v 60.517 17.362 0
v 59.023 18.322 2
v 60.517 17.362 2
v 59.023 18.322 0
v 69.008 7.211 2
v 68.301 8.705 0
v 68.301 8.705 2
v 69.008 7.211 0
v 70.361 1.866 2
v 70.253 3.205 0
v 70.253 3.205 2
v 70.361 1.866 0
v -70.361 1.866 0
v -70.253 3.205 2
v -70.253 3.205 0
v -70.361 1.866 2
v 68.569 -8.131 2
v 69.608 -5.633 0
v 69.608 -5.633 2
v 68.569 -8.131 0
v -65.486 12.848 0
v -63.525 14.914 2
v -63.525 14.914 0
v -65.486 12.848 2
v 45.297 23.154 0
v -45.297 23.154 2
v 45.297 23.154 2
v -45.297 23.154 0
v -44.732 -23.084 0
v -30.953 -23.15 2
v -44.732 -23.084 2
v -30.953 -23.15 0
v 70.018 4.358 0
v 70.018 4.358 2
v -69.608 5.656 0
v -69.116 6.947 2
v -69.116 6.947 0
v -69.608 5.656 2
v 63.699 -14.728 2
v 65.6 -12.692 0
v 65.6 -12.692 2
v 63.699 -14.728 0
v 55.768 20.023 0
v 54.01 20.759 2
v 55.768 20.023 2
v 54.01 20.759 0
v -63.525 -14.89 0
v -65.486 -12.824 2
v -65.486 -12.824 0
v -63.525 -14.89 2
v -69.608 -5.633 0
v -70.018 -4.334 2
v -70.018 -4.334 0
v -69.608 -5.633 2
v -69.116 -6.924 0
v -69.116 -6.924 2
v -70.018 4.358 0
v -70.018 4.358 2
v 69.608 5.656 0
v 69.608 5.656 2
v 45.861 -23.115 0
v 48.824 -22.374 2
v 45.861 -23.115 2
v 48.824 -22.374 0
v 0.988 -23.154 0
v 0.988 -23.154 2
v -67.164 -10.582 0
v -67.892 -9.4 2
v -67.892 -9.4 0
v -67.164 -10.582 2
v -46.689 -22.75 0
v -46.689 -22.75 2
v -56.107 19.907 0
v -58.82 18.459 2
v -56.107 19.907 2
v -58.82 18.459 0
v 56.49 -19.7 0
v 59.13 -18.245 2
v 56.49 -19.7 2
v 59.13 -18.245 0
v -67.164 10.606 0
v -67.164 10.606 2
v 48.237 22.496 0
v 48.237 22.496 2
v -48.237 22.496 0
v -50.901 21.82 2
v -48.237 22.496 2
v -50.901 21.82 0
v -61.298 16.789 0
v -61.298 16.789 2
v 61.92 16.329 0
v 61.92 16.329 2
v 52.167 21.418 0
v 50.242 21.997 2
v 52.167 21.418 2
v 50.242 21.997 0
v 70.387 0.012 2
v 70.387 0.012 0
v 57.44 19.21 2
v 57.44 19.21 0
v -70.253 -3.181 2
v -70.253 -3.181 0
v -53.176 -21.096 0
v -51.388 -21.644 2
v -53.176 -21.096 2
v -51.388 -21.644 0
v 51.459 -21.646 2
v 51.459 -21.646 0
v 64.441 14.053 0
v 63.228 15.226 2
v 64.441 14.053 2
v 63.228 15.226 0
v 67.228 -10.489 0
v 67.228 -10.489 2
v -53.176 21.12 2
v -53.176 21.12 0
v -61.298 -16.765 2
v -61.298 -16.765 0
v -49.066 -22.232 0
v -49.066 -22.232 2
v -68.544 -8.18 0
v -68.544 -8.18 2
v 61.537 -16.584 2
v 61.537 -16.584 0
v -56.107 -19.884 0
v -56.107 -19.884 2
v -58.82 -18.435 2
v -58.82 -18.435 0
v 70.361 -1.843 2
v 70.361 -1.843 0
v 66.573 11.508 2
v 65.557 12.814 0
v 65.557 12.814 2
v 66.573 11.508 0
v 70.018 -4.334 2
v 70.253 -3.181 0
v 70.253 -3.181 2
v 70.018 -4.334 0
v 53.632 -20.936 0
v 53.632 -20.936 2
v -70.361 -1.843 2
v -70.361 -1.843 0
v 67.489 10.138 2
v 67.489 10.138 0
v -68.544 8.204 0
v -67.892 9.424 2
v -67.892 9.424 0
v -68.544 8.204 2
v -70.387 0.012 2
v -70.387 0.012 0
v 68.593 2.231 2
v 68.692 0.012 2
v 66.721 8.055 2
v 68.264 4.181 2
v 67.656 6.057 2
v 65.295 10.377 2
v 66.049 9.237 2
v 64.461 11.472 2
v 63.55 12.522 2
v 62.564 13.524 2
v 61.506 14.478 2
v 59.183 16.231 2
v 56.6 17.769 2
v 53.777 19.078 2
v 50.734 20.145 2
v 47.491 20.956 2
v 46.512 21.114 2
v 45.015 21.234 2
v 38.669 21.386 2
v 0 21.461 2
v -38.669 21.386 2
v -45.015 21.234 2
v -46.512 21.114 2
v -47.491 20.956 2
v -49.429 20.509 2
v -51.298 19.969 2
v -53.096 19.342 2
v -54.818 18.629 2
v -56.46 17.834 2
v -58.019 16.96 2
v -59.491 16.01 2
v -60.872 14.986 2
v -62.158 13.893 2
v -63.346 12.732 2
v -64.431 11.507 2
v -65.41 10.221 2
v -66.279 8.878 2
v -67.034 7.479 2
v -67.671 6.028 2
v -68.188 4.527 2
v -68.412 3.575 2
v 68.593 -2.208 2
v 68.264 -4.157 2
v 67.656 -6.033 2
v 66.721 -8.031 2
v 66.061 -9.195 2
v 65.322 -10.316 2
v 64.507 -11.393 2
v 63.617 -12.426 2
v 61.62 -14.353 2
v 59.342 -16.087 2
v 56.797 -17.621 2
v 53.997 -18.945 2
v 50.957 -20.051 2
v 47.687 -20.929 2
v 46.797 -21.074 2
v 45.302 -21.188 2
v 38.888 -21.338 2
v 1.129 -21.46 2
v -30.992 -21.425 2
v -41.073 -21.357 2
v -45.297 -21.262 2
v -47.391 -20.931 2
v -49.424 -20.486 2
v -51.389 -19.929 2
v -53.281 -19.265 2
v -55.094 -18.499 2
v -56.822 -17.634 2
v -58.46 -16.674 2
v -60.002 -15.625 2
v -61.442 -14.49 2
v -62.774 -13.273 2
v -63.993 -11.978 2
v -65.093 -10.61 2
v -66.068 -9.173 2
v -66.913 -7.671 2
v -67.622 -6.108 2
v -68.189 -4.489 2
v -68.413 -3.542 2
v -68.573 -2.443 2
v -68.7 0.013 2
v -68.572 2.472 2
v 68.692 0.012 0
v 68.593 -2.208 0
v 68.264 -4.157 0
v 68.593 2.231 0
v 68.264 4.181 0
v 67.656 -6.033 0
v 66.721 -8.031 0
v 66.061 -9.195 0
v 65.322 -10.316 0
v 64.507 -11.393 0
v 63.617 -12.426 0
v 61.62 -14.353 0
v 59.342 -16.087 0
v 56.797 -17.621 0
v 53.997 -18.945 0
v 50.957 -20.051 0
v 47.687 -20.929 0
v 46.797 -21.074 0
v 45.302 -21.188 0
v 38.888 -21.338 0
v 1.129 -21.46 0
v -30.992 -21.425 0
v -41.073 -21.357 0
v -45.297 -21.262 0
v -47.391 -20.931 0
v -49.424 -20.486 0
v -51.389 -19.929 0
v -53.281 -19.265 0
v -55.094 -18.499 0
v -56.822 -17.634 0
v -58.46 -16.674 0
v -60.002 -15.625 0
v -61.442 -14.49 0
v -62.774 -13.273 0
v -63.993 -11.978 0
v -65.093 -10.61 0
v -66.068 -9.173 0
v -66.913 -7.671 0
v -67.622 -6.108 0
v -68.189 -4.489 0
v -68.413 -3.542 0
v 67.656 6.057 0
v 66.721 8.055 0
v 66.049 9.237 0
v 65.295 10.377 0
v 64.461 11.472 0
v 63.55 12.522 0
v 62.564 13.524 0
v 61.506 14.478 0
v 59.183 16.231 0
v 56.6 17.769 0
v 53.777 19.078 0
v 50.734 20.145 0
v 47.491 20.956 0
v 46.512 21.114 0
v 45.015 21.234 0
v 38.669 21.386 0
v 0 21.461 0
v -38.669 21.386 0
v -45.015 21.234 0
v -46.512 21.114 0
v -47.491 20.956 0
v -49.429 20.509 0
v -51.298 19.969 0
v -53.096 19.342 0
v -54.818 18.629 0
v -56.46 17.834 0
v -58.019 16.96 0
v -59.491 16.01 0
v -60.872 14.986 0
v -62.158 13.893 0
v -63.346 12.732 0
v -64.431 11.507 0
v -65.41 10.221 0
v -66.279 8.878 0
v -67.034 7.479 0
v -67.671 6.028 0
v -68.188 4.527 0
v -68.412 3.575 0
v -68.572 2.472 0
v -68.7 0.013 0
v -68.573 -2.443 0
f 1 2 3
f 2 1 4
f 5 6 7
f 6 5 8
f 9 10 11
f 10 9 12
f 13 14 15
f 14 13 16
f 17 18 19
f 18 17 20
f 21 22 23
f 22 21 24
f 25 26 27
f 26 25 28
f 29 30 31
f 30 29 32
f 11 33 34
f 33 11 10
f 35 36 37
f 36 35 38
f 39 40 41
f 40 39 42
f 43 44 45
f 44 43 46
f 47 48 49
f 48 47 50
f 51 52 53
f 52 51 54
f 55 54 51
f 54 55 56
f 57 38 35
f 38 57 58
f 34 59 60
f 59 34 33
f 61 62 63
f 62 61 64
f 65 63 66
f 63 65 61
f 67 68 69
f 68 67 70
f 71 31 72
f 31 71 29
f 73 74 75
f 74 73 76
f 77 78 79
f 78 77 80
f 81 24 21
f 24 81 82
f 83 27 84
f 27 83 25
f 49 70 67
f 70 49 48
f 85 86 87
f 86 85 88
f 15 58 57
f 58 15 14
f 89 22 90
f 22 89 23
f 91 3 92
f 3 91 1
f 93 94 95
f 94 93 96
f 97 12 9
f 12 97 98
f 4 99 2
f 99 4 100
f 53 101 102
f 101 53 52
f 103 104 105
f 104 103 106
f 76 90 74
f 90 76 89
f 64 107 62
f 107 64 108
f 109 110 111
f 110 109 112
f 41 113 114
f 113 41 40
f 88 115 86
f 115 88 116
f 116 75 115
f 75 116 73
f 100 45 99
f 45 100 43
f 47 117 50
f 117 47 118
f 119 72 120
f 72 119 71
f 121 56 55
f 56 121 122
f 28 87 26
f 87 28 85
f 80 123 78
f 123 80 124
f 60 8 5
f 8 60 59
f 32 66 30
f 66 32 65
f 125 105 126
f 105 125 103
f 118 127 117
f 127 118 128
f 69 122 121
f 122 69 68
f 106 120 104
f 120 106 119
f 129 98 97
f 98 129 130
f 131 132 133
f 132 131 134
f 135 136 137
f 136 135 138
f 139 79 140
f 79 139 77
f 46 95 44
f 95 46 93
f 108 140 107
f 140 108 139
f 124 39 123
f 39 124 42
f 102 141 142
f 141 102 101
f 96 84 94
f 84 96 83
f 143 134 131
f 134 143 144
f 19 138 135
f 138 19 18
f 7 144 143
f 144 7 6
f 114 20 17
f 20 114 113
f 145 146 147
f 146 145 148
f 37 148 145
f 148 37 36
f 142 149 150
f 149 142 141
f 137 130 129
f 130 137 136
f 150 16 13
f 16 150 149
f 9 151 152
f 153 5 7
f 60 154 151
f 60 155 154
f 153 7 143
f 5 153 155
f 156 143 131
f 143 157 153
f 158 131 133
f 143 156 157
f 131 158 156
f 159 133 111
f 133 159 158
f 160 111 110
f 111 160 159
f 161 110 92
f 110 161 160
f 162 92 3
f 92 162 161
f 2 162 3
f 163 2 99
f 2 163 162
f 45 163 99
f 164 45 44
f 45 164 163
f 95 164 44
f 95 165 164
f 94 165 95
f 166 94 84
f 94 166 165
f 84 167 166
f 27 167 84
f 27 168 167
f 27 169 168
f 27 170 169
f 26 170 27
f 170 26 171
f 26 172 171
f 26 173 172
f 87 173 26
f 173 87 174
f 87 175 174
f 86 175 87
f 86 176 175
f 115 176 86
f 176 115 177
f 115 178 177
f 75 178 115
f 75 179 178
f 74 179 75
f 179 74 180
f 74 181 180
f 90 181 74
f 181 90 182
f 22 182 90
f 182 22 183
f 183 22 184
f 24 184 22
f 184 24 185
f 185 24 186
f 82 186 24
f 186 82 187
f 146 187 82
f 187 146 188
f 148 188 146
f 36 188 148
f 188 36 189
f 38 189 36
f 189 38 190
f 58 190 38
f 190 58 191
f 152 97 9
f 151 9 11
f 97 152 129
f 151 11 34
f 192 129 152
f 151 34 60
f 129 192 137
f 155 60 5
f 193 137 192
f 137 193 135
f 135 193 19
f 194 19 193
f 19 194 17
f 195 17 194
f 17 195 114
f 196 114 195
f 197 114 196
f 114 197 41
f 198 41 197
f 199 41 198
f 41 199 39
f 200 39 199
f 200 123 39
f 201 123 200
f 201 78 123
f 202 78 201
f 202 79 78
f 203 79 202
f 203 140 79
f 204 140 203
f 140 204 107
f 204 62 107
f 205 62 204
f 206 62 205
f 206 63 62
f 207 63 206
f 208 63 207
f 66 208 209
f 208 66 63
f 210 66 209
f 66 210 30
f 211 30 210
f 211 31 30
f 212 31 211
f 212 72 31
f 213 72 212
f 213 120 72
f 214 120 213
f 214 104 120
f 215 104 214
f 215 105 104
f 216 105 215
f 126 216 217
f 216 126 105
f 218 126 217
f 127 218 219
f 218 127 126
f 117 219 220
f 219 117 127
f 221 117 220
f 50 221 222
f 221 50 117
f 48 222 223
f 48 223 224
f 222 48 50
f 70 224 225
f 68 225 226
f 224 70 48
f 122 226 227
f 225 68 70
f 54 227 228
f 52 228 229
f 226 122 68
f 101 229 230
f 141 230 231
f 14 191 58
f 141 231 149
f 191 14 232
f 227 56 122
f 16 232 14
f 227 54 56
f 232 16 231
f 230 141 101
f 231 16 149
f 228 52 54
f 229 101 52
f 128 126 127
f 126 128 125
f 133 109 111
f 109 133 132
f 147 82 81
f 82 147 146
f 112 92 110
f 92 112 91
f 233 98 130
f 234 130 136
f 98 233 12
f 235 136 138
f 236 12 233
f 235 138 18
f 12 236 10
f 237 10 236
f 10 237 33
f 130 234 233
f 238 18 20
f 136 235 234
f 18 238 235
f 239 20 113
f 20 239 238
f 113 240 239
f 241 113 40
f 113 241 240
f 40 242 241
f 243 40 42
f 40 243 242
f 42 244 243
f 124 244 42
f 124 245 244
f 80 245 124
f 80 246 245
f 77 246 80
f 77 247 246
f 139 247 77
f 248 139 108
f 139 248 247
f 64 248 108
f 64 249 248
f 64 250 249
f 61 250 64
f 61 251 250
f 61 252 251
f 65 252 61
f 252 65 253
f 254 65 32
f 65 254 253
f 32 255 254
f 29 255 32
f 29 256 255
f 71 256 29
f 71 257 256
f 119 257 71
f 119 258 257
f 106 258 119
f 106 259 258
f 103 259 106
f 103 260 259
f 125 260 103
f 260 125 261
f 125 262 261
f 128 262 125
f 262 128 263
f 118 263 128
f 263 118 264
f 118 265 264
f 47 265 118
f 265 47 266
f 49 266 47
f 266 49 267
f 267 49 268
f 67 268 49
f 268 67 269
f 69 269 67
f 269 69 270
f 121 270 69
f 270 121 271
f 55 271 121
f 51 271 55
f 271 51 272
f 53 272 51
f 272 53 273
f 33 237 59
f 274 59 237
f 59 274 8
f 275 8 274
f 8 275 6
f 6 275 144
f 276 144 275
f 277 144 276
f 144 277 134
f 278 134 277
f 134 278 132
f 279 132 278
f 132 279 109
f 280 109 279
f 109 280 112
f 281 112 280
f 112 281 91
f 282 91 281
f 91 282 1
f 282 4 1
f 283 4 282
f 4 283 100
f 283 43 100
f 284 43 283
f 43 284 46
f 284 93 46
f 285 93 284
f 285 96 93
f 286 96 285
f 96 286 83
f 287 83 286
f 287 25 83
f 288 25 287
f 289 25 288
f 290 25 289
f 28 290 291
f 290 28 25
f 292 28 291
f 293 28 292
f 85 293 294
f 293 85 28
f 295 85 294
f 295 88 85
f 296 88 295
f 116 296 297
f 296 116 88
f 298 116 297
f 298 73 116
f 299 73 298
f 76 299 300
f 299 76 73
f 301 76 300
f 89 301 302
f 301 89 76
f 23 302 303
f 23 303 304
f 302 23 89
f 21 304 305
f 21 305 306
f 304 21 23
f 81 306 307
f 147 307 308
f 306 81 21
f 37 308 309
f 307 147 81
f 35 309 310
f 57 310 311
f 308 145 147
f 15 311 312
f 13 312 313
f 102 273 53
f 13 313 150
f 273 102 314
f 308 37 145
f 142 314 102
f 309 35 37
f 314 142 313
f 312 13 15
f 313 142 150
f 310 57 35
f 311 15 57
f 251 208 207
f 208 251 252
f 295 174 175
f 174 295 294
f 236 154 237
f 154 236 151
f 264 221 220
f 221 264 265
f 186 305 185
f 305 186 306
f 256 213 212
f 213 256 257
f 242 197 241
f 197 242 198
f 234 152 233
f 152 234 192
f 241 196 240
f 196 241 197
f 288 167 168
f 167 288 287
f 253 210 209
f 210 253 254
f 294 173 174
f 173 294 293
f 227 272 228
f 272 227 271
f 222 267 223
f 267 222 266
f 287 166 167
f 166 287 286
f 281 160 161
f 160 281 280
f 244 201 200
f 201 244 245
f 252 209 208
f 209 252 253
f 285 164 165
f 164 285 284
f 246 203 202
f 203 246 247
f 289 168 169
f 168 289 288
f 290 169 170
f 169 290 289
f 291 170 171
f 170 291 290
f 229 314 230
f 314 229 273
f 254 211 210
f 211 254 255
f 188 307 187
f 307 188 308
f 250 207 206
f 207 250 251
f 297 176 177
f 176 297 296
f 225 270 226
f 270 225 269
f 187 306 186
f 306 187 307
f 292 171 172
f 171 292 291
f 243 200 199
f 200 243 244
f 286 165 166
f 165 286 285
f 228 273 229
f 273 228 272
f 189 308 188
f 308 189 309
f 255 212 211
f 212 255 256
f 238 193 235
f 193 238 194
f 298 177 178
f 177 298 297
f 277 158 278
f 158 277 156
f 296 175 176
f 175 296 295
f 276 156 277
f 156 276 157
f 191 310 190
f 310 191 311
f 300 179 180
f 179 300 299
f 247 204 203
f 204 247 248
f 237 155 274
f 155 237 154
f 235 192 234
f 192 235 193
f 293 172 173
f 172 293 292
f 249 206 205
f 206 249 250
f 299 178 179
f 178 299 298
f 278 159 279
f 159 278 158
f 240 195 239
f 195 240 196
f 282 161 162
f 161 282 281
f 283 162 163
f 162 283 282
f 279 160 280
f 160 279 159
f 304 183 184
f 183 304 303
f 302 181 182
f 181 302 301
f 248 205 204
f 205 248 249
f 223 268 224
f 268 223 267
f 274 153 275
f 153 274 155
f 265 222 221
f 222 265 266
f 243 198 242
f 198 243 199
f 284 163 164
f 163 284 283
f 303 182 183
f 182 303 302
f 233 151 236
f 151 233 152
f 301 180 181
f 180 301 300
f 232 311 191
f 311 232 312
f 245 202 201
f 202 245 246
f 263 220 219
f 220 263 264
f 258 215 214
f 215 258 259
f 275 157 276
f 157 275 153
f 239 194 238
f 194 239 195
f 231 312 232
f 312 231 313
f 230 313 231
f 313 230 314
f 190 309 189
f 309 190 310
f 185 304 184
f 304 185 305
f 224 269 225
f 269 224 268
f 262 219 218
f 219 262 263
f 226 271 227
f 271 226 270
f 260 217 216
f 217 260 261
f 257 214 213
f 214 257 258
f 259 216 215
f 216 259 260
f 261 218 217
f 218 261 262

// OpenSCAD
// Module names are of the form poly_<inkscape-path-id>().  As a result,
// you can associate a polygon in this OpenSCAD program with the corresponding
// SVG element in the Inkscape document by looking for the XML element with
// the attribute id="inkscape-path-id".

// fudge value is used to ensure that subtracted solids are a tad taller
// in the z dimension than the polygon being subtracted from.  This helps
// keep the resulting .stl file manifold.
fudge = 0.1;

module poly_path3027(h)
{
  scale([25.4/90, -25.4/90, 1]) union()
  {
    difference()
    {
       linear_extrude(height=h)
         polygon([[-158.500006,81.793990],[-165.432780,80.609589],[-173.856986,78.775596],[-182.082397,76.689928],[-188.418786,74.750500],[-198.804823,70.453364],[-208.416354,65.320332],[-217.196650,59.404788],[-225.088984,52.760115],[-232.036629,45.439695],[-237.982856,37.496912],[-240.562710,33.308817],[-242.870937,28.985150],[-244.900446,24.532583],[-246.644146,19.957790],[-248.094232,15.355962],[-248.929660,11.270513],[-249.312250,6.528700],[-249.403820,-0.042220],[-249.312250,-6.613136],[-248.929660,-11.354949],[-248.094232,-15.440397],[-246.644146,-20.042220],[-244.900446,-24.617013],[-242.870937,-29.069580],[-240.562710,-33.393247],[-237.982856,-37.581343],[-232.036629,-45.524125],[-225.088984,-52.844545],[-217.196650,-59.489218],[-208.416354,-65.404763],[-198.804823,-70.537794],[-188.418786,-74.834930],[-180.357158,-77.315728],[-170.918786,-79.709840],[-160.500006,-82.042220],[0.000000,-82.042220],[160.500000,-82.042220],[170.918780,-79.709840],[178.024134,-77.942980],[184.844178,-75.890024],[191.372264,-73.556211],[197.601742,-70.946781],[203.525965,-68.066970],[209.138285,-64.922018],[214.432053,-61.517164],[219.400620,-57.857646],[224.037339,-53.948702],[228.335560,-49.795571],[232.288636,-45.403492],[235.889918,-40.777703],[239.132758,-35.923443],[242.010507,-30.845950],[244.516517,-25.550463],[246.644140,-20.042220],[248.094227,-15.440397],[248.929657,-11.354949],[249.312249,-6.613136],[249.403820,-0.042220],[249.312249,6.528700],[248.929657,11.270513],[248.094227,15.355962],[246.644140,19.957790],[242.959800,28.811414],[238.209221,37.165048],[232.440987,44.972157],[225.703681,52.186204],[218.045888,58.760652],[209.516191,64.648965],[200.163174,69.804606],[190.035420,74.181040],[182.335405,76.697968],[173.000000,79.277880],[162.500000,81.902640],[3.500000,82.042220],[-109.675003,82.026904],[-158.500006,81.793990]]);
       translate([0, 0, -fudge])
         linear_extrude(height=h+2*fudge)
           polygon([[168.971440,74.158600],[180.555163,71.045460],[191.329337,67.127660],[201.248247,62.436178],[210.266176,57.001992],[218.337409,50.856083],[225.416230,44.029427],[228.569199,40.370500],[231.456922,36.553003],[234.073684,32.580809],[236.413770,28.457790],[239.724693,21.377309],[241.878877,14.730247],[243.046553,7.821954],[243.397950,-0.042219],[243.046553,-7.906390],[241.878877,-14.814680],[239.724693,-21.461739],[236.413770,-28.542219],[234.032171,-32.729947],[231.359659,-36.767514],[228.404944,-40.649078],[225.176732,-44.368799],[221.683730,-47.920835],[217.934645,-51.299344],[209.703059,-57.512415],[200.551630,-62.961280],[190.550019,-67.599206],[179.767883,-71.379460],[168.274880,-74.255310],[164.807676,-74.812061],[159.502596,-75.239776],[137.016183,-75.775664],[0.000000,-76.042220],[-137.016186,-75.775664],[-159.502601,-75.239776],[-164.807682,-74.812061],[-168.274886,-74.255310],[-175.141237,-72.668117],[-181.766070,-70.757529],[-188.135912,-68.534242],[-194.237291,-66.008951],[-200.056731,-63.192351],[-205.580761,-60.095138],[-210.795906,-56.728006],[-215.688693,-53.101652],[-220.245648,-49.226770],[-224.453299,-45.114055],[-228.298171,-40.774203],[-231.766792,-36.217909],[-234.845687,-31.455869],[-237.521384,-26.498777],[-239.780408,-21.357329],[-241.609287,-16.042220],[-242.403583,-12.668975],[-242.971138,-8.758611],[-243.425933,-0.046353],[-242.973479,8.654903],[-242.406975,12.551515],[-241.613587,15.905507],[-239.605357,21.643556],[-237.094329,27.181117],[-234.100778,32.503334],[-230.644977,37.595354],[-226.747203,42.442319],[-222.427730,47.029376],[-217.706833,51.341669],[-212.604787,55.364342],[-207.141866,59.082541],[-201.338346,62.481410],[-195.214501,65.546095],[-188.790607,68.261739],[-182.086937,70.613488],[-175.123768,72.586486],[-167.921373,74.165878],[-160.500028,75.336810],[-145.532494,75.672687],[-109.814498,75.915564],[3.999980,76.037650],[137.791456,75.608080],[160.518017,75.075637],[165.817630,74.673294],[168.971420,74.158600]]);
       translate([0, 0, -fudge])
         linear_extrude(height=h+2*fudge)
           polygon([[200.000000,50.417950],[200.618109,48.471970],[202.104200,45.253540],[203.273133,42.726358],[203.716755,40.399174],[203.479099,37.060718],[202.604200,31.499720],[201.471234,23.445727],[201.000000,17.603770],[201.000000,13.337048],[204.750000,13.647418],[208.500000,13.957778],[209.000000,21.127770],[209.551778,26.389241],[210.176260,28.970700],[210.553669,29.052392],[211.041463,28.685677],[212.288103,26.724090],[213.795978,23.320081],[215.444890,18.707790],[216.497714,15.701972],[217.461245,14.140114],[218.852568,13.549591],[221.188770,13.457778],[223.444466,13.514289],[224.569576,13.837642],[224.846880,14.658565],[224.559160,16.207788],[222.548565,21.405451],[218.707861,29.483793],[214.170537,38.174134],[210.070080,45.207790],[207.871155,48.464072],[206.225519,50.359207],[204.740996,51.241134],[203.025410,51.457790],[200.888716,51.152336],[200.238725,50.821700],[200.000000,50.417950]]);
       translate([0, 0, -fudge])
         linear_extrude(height=h+2*fudge)
           polygon([[-131.000000,41.436420],[-152.097248,40.736645],[-162.799136,40.014820],[-164.686382,39.503418],[-165.634001,38.707081],[-165.914188,37.090989],[-165.799136,34.120320],[-165.313166,30.610099],[-164.678714,29.342374],[-163.589887,28.252473],[-161.901638,27.230068],[-159.468920,26.164835],[-151.789886,23.464580],[-145.079750,21.214820],[-144.789880,13.586298],[-144.500000,5.957781],[-137.500000,4.152891],[-131.141607,2.967885],[-128.224904,2.824442],[-125.386593,2.991496],[-122.554220,3.477390],[-119.655334,4.290467],[-113.368210,6.931541],[-109.994867,8.809248],[-106.717537,11.058845],[-103.556547,13.659053],[-100.532226,16.588596],[-97.664901,19.826193],[-94.974900,23.350566],[-92.482550,27.140438],[-90.208180,31.174530],[-87.236153,37.356350],[-86.000000,40.860490],[-85.938530,41.447067],[-86.191032,41.869845],[-87.412873,42.137210],[-90.259419,42.257551],[-131.000000,41.436420]]);
       translate([0, 0, -fudge])
         linear_extrude(height=h+2*fudge)
           polygon([[-58.698150,40.802010],[-58.666610,38.631016],[-58.036163,34.290573],[-55.625831,22.071731],[-52.761729,10.086265],[-51.564068,6.037544],[-50.738430,4.274961],[-49.423887,3.918529],[-47.022183,3.673774],[-40.404057,3.509563],[-33.777573,3.762867],[-31.365421,4.040004],[-30.036250,4.414221],[-29.376304,4.994339],[-29.085989,5.735073],[-29.556370,8.148901],[-30.255967,9.707343],[-31.348181,10.586848],[-33.400840,11.025402],[-36.981770,11.260991],[-41.395698,11.662502],[-44.161845,12.472924],[-45.024594,13.082472],[-45.592512,13.855443],[-46.000000,15.973247],[-45.653100,17.634715],[-44.489701,18.708415],[-42.325760,19.285666],[-38.977230,19.457790],[-36.257387,19.652595],[-34.775585,20.341206],[-34.387680,21.679920],[-34.949530,23.825030],[-35.650065,25.194883],[-36.765160,25.998627],[-38.771743,26.424053],[-42.146740,26.658950],[-48.380130,26.957790],[-50.116580,33.853360],[-51.731722,38.969844],[-52.525613,40.718125],[-53.176510,41.588040],[-54.854786,42.292421],[-56.492064,42.373777],[-57.851975,41.865757],[-58.698150,40.802010]]);
       translate([0, 0, -fudge])
         linear_extrude(height=h+2*fudge)
           polygon([[-32.859750,41.565630],[-33.458773,40.699361],[-33.535597,38.813909],[-31.956870,29.830940],[-28.894740,16.767948],[-27.922445,15.442804],[-26.190739,14.312522],[-23.934467,13.418707],[-21.388472,12.802962],[-18.787600,12.506892],[-16.366692,12.572101],[-14.360594,13.040195],[-13.004150,13.952778],[-12.563260,14.851504],[-12.512551,15.900996],[-13.332577,18.068047],[-14.966043,19.685479],[-15.932132,20.047947],[-16.914760,19.984840],[-18.218906,19.678335],[-19.319168,19.702336],[-20.259056,20.119484],[-21.082077,20.992420],[-22.551553,24.356224],[-24.075660,30.294880],[-25.923786,37.086139],[-26.870005,39.405207],[-27.865564,41.050925],[-28.936390,42.056559],[-30.108412,42.455376],[-31.407556,42.280644],[-32.859750,41.565630]]);
       translate([0, 0, -fudge])
         linear_extrude(height=h+2*fudge)
           polygon([[-10.922170,39.689470],[-12.621994,37.592711],[-13.792137,35.293396],[-14.468278,32.848289],[-14.686097,30.314154],[-14.481271,27.747756],[-13.889479,25.205857],[-12.946402,22.745223],[-11.687718,20.422618],[-10.149104,18.294805],[-8.366242,16.418548],[-6.374809,14.850612],[-4.210485,13.647761],[-1.908948,12.866759],[0.494123,12.564371],[2.963049,12.797359],[5.462150,13.622488],[6.637366,14.374270],[7.659728,15.478489],[8.511603,16.911279],[9.175360,18.648770],[10.332310,22.510320],[13.256160,18.963200],[16.141002,16.080422],[19.254081,14.022503],[22.431931,12.789255],[25.511084,12.380491],[28.328071,12.796021],[30.719427,14.035658],[32.521682,16.099214],[33.571370,18.986500],[34.173460,21.389558],[34.891564,22.268201],[35.879171,21.645459],[37.289770,19.544360],[39.564663,17.059853],[42.994119,14.776867],[46.824290,13.105983],[50.301330,12.457781],[51.738142,12.307239],[52.703799,11.683856],[53.417064,10.329995],[54.096700,7.988021],[55.295760,4.495816],[56.598110,2.376351],[58.309712,1.756556],[60.431327,1.889995],[62.236807,2.617476],[62.794074,3.154237],[63.000000,3.779811],[59.905580,18.510760],[57.738130,29.572347],[57.287446,33.514472],[57.284520,36.223590],[57.320849,39.423789],[57.098688,40.538363],[56.739740,41.118640],[53.590705,41.667211],[47.449380,42.102480],[42.658138,42.253528],[39.909156,42.015202],[38.215089,41.140071],[36.588590,39.380700],[35.294912,37.610381],[34.503885,35.817329],[34.108063,33.642307],[34.000000,30.726080],[33.957180,27.686479],[33.739981,26.203447],[33.215291,25.968787],[32.250000,26.674300],[30.025836,28.335358],[27.523449,29.702644],[24.821837,30.739658],[22.000000,31.409900],[20.179488,31.832645],[18.981766,32.360433],[18.386764,32.949102],[18.374407,33.554493],[18.924625,34.132443],[20.017345,34.638793],[23.750000,35.260050],[26.547459,35.490152],[28.132464,35.883791],[28.838736,36.603060],[29.000000,37.810050],[28.605596,40.007759],[28.078221,40.813436],[27.300179,41.441920],[24.900442,42.222081],[21.223080,42.457790],[18.333933,42.353455],[16.284207,41.935974],[14.628918,41.048630],[12.923080,39.534710],[11.396621,37.816142],[10.510671,36.142771],[10.100155,34.032888],[10.000000,31.004780],[10.000000,25.397920],[7.068950,27.564930],[3.583327,29.454814],[-0.681050,30.955530],[-4.315598,32.261280],[-5.211122,32.930249],[-5.493393,33.577340],[-5.163347,34.178096],[-4.221923,34.708060],[-0.508680,35.457790],[3.475055,36.239051],[4.412208,36.876788],[4.823890,37.755830],[4.723197,39.857264],[4.242596,40.667260],[3.467277,41.321701],[1.008849,42.178693],[-2.699370,42.457790],[-5.605527,42.355388],[-7.665035,41.954025],[-9.297411,41.112464],[-10.922170,39.689470]]);
       translate([0, 0, -fudge])
         linear_extrude(height=h+2*fudge)
           polygon([[47.760750,34.207790],[48.645541,32.079082],[49.716960,28.301380],[50.620087,24.277077],[51.000000,21.408570],[50.784290,20.786907],[50.198571,20.447795],[48.285570,20.527650],[45.997929,21.468985],[44.072580,23.092650],[42.785765,25.789164],[42.039073,29.332016],[41.957656,32.679803],[42.205537,33.955108],[42.666670,34.791120],[43.771773,35.349448],[45.218780,35.412040],[46.663252,35.018339],[47.760750,34.207790]]);
       translate([0, 0, -fudge])
         linear_extrude(height=h+2*fudge)
           polygon([[0.471350,24.102400],[1.553245,22.726849],[1.698169,21.202468],[0.994690,19.966900],[-0.468620,19.457790],[-2.055060,20.021444],[-3.876231,21.377534],[-5.376442,23.023752],[-6.000000,24.457790],[-5.810436,24.926209],[-5.292287,25.239775],[-3.573485,25.419000],[-1.450103,25.028773],[0.471350,24.102400]]);
       translate([0, 0, -fudge])
         linear_extrude(height=h+2*fudge)
           polygon([[24.471350,24.102400],[25.553245,22.726849],[25.698169,21.202468],[24.994690,19.966900],[23.531380,19.457790],[21.796463,20.070189],[19.988701,21.510560],[18.700069,23.183663],[18.435418,23.921478],[18.522540,24.494260],[19.508353,25.237806],[21.006940,25.408585],[22.750529,25.024236],[24.471350,24.102400]]);
       translate([0, 0, -fudge])
         linear_extrude(height=h+2*fudge)
           polygon([[65.888050,40.958150],[63.531923,39.008415],[61.965964,36.195926],[61.221290,32.606897],[61.329020,28.327540],[62.013408,24.748545],[63.148112,21.549633],[64.689453,18.774253],[66.593754,16.465855],[68.817337,14.667891],[71.316524,13.423810],[74.047638,12.777062],[76.967000,12.771098],[79.196478,13.160137],[81.084051,13.811309],[82.643478,14.742019],[83.888518,15.969672],[84.832930,17.511674],[85.490475,19.385431],[85.874912,21.608348],[86.000000,24.197830],[85.533408,28.966051],[84.220686,33.188142],[82.192412,36.755286],[79.579166,39.558664],[76.511528,41.489457],[73.120076,42.438849],[69.535390,42.298019],[67.711391,41.784765],[65.888050,40.958150]]);
       translate([0, 0, -fudge])
         linear_extrude(height=h+2*fudge)
           polygon([[76.067170,32.457790],[77.742901,29.444412],[78.519321,26.490112],[78.374023,23.795436],[77.284600,21.560930],[75.982940,20.443444],[74.600559,20.090356],[73.215830,20.424594],[71.907125,21.369085],[70.752817,22.846757],[69.831278,24.780537],[69.220882,27.093352],[69.000000,29.708130],[69.167366,31.729723],[69.636927,33.309900],[70.359876,34.429671],[71.287404,35.070046],[72.370705,35.212036],[73.560971,34.836649],[74.809395,33.924897],[76.067170,32.457790]]);
       translate([0, 0, -fudge])
         linear_extrude(height=h+2*fudge)
           polygon([[87.208020,41.207790],[87.030645,39.710356],[87.323018,36.643156],[88.883875,27.864087],[91.024332,18.999836],[92.041205,15.826159],[92.878130,14.179658],[94.086038,13.590283],[96.720688,13.283282],[109.250000,13.368828],[117.088350,13.198168],[119.770405,13.162901],[121.595949,13.433319],[122.917694,14.116262],[124.088350,15.318568],[124.882003,16.549697],[125.456372,18.026496],[125.948364,21.805189],[125.566528,26.830806],[124.313070,33.279510],[122.923014,38.059253],[121.341236,40.949104],[120.420791,41.752167],[119.383223,42.162973],[118.205467,42.208261],[116.864460,41.914770],[115.885427,41.474625],[115.345013,40.851229],[115.193222,39.933253],[115.380060,38.609370],[117.010459,30.613432],[117.737155,25.476355],[117.616568,22.437028],[116.705120,20.734340],[115.766178,19.990629],[114.911541,19.755965],[114.121521,20.062084],[113.376433,20.940723],[111.942300,24.542502],[110.451650,30.815190],[108.803488,37.376191],[107.934841,39.603475],[107.001821,41.173174],[105.978435,42.118709],[104.838686,42.473502],[103.556580,42.270972],[102.106120,41.544540],[101.455256,40.751694],[101.289841,39.153576],[102.494850,31.484300],[103.416387,26.468666],[103.746923,23.501026],[103.499939,21.833483],[102.688920,20.718140],[101.747732,19.985762],[100.873194,19.766644],[100.047937,20.086894],[99.254591,20.972620],[97.694160,24.544929],[96.052950,30.692430],[94.247669,37.519575],[92.854610,41.132970],[91.577884,42.079644],[90.019739,42.410206],[88.467381,42.120851],[87.208020,41.207770]]);
       translate([0, 0, -fudge])
         linear_extrude(height=h+2*fudge)
           polygon([[139.750000,41.826890],[139.007180,41.429701],[138.466925,40.749193],[138.045510,38.634470],[139.118320,31.757169],[141.498039,20.769934],[144.092645,10.368268],[145.810120,5.247671],[146.786579,4.679244],[148.362346,4.225522],[152.664345,3.697356],[157.421189,3.733505],[161.337950,4.404301],[164.749600,6.254977],[167.950020,9.053631],[169.578551,11.105629],[170.498985,13.024055],[170.907431,15.450036],[171.000000,19.024700],[170.637112,24.145803],[169.554921,28.646237],[167.763132,32.516065],[165.271455,35.745349],[162.089596,38.324152],[158.227262,40.242536],[153.694161,41.490565],[148.500000,42.058300],[143.042188,42.107629],[139.750000,41.826890]]);
       translate([0, 0, -fudge])
         linear_extrude(height=h+2*fudge)
           polygon([[158.211130,31.796610],[160.590678,29.005431],[162.127008,25.801492],[162.852771,22.426719],[162.800621,19.123039],[162.003212,16.132379],[160.493197,13.696664],[158.303228,12.057823],[156.963466,11.612832],[155.465960,11.457781],[153.258302,11.638844],[152.488281,12.145884],[151.822945,13.180117],[150.452763,17.578727],[148.440630,26.331800],[147.387790,32.308806],[147.489786,33.740928],[147.993200,34.453590],[149.982621,34.794773],[152.846205,34.336316],[155.837769,33.272251],[158.211130,31.796610]]);
       translate([0, 0, -fudge])
         linear_extrude(height=h+2*fudge)
           polygon([[175.506180,40.054870],[173.547756,37.392171],[172.413528,34.271399],[172.069702,30.848195],[172.482483,27.278197],[173.618077,23.717047],[175.442691,20.320384],[177.922530,17.243847],[181.023800,14.643078],[183.017203,13.455481],[184.928903,12.795819],[187.202173,12.570337],[190.280290,12.685281],[195.217879,13.325371],[196.715946,13.952978],[197.647523,14.928664],[198.073103,16.359709],[198.053182,18.353392],[196.918820,24.457790],[195.711121,31.574046],[195.571670,36.605160],[195.678209,39.497764],[195.409210,40.439538],[194.931930,40.999860],[191.751015,41.627719],[185.801280,42.087840],[181.442528,42.206752],[178.751681,42.001936],[177.011859,41.331830],[175.506180,40.054870]]);
       translate([0, 0, -fudge])
         linear_extrude(height=h+2*fudge)
           polygon([[185.812710,34.594700],[186.429734,33.771249],[187.092990,32.192770],[188.340258,27.740646],[189.118621,23.178162],[189.195748,21.461732],[188.992190,20.445150],[188.422578,19.962630],[187.598227,19.837813],[185.488546,20.501607],[183.269615,22.117178],[181.547900,24.365170],[180.547105,26.833604],[180.081278,29.194083],[180.102063,31.330621],[180.561104,33.127234],[181.410045,34.467934],[182.600530,35.236735],[184.084204,35.317653],[185.812710,34.594700]]);
       translate([0, 0, -fudge])
         linear_extrude(height=h+2*fudge)
           polygon([[-216.000006,31.030370],[-215.318121,28.948957],[-213.628742,26.806794],[-211.466280,25.133273],[-209.365146,24.457790],[-208.349600,24.600149],[-208.164652,25.255866],[-210.632896,29.479230],[-212.728311,32.132738],[-214.433610,33.308222],[-215.087321,33.326491],[-215.580330,32.956996],[-216.000006,31.030370]]);
       translate([0, 0, -fudge])
         linear_extrude(height=h+2*fudge)
           polygon([[-197.779786,25.207790],[-199.125654,22.512708],[-200.213665,18.326943],[-200.928586,13.242968],[-201.155186,7.853260],[-200.623154,1.699270],[-199.215861,-4.035070],[-197.016974,-9.314312],[-194.110157,-14.103011],[-190.579075,-18.365718],[-186.507394,-22.066987],[-181.978779,-25.171371],[-177.076895,-27.643423],[-171.885408,-29.447695],[-166.487982,-30.548742],[-160.968282,-30.911115],[-155.409975,-30.499368],[-149.896725,-29.278054],[-144.512197,-27.211726],[-139.340057,-24.264937],[-134.463970,-20.402240],[-130.988732,-16.634509],[-127.604919,-12.090689],[-125.036983,-7.841121],[-124.285362,-6.161165],[-124.009380,-4.956150],[-124.758063,-4.434717],[-126.863753,-3.861921],[-134.250000,-2.754770],[-144.500000,-1.639460],[-147.500000,-4.540160],[-151.099861,-7.362389],[-155.003895,-9.254750],[-159.080488,-10.229442],[-163.198026,-10.298661],[-167.224898,-9.474607],[-171.029489,-7.769477],[-174.480186,-5.195468],[-177.445376,-1.764780],[-178.931006,0.609492],[-179.851216,2.795225],[-180.330531,5.200956],[-180.493476,8.235220],[-180.721241,12.450499],[-181.291462,14.997084],[-181.715132,15.668033],[-182.236581,15.949907],[-182.859864,15.852073],[-183.589036,15.383897],[-184.218468,14.401116],[-184.660261,12.766133],[-184.986552,8.212108],[-184.579158,3.066919],[-183.449326,-1.324340],[-181.340651,-5.125885],[-178.369940,-8.640090],[-174.701592,-11.704063],[-170.500006,-14.154910],[-167.054032,-16.029544],[-167.018146,-16.406425],[-168.000006,-16.510490],[-171.321869,-15.913515],[-175.118356,-14.311964],[-178.927196,-11.946926],[-182.286116,-9.059490],[-184.067224,-7.008170],[-185.556774,-4.812414],[-186.761136,-2.450808],[-187.686681,0.098060],[-188.339779,2.855605],[-188.726800,5.843239],[-188.728096,12.594430],[-188.191786,20.418990],[-191.630696,23.438390],[-193.992215,25.385772],[-195.576576,26.264289],[-196.725270,26.172206],[-197.779786,25.207790]]);
       translate([0, 0, -fudge])
         linear_extrude(height=h+2*fudge)
           polygon([[-225.703206,9.355401],[-226.415587,8.022953],[-226.055200,6.723389],[-224.834643,5.541778],[-222.966517,4.563190],[-220.663422,3.872697],[-218.137956,3.555367],[-215.602721,3.696272],[-213.270316,4.380481],[-211.717939,5.369505],[-211.512035,5.834970],[-211.696810,6.293631],[-213.269856,7.228227],[-216.500006,8.248660],[-222.500006,9.937640],[-224.265946,10.023103],[-225.703206,9.355401]]);
       translate([0, 0, -fudge])
         linear_extrude(height=h+2*fudge)
           polygon([[-81.000000,-4.874929],[-83.992307,-6.035151],[-84.978575,-6.767840],[-85.623151,-7.598962],[-85.924710,-8.526050],[-85.881925,-9.546641],[-84.758020,-11.858469],[-83.980790,-12.728714],[-83.163297,-13.119888],[-82.117457,-13.066040],[-80.655180,-12.601220],[-77.826160,-11.821442],[-75.096972,-11.588153],[-72.783094,-11.896648],[-71.200000,-12.742220],[-70.117840,-14.521739],[-70.068672,-15.463427],[-70.353151,-16.452539],[-71.940167,-18.611442],[-74.913120,-21.075270],[-78.782855,-24.501171],[-80.122607,-26.208495],[-80.924380,-27.755120],[-81.620473,-31.199030],[-81.315320,-34.402644],[-80.112583,-37.269880],[-78.115926,-39.704656],[-75.429013,-41.610891],[-72.155507,-42.892503],[-68.399072,-43.453410],[-64.263370,-43.197530],[-61.059642,-42.350985],[-59.070412,-41.053741],[-58.533991,-40.239146],[-58.304504,-39.315522],[-58.770740,-37.146050],[-59.524402,-35.806874],[-60.535054,-35.134718],[-62.277951,-34.988300],[-65.228350,-35.226340],[-68.201644,-35.310490],[-70.475727,-34.924808],[-72.027252,-34.138540],[-72.832871,-33.020938],[-72.869236,-31.641248],[-72.113000,-30.068721],[-70.540814,-28.372606],[-68.129330,-26.622150],[-65.736055,-24.907448],[-63.829597,-23.034871],[-62.416923,-21.027334],[-61.505001,-18.907753],[-61.100800,-16.699042],[-61.211287,-14.424118],[-61.843431,-12.105896],[-63.004200,-9.767290],[-64.324923,-8.053774],[-65.996108,-6.631970],[-67.975204,-5.513446],[-70.219657,-4.709771],[-72.686916,-4.232513],[-75.334428,-4.093241],[-78.119640,-4.303524],[-81.000000,-4.874930]]);
       translate([0, 0, -fudge])
         linear_extrude(height=h+2*fudge)
           polygon([[-52.000000,-4.857529],[-53.769918,-5.679160],[-55.261803,-6.822299],[-56.479825,-8.244194],[-57.428153,-9.902095],[-58.532406,-13.754909],[-58.607923,-18.038734],[-57.688061,-22.411564],[-55.806179,-26.531391],[-54.514905,-28.389551],[-52.995636,-30.056208],[-51.252541,-31.488611],[-49.289790,-32.644009],[-46.728761,-33.622220],[-44.251954,-34.066486],[-41.910589,-33.996935],[-39.755885,-33.433697],[-37.839060,-32.396897],[-36.211333,-30.906666],[-34.923924,-28.983130],[-34.028050,-26.646419],[-33.552362,-23.507827],[-33.684606,-20.165907],[-34.354551,-16.784341],[-35.491961,-13.526814],[-37.026604,-10.557007],[-38.888245,-8.038604],[-41.006652,-6.135287],[-43.311590,-5.010739],[-46.096544,-4.277525],[-48.070826,-4.014675],[-49.837593,-4.211554],[-52.000000,-4.857529]]);
       translate([0, 0, -fudge])
         linear_extrude(height=h+2*fudge)
           polygon([[-43.477350,-13.936480],[-42.093116,-16.843788],[-41.329920,-20.069065],[-41.269346,-23.002374],[-41.528038,-24.168936],[-41.992980,-25.033780],[-43.671175,-26.266438],[-45.460883,-26.308979],[-47.216607,-25.367694],[-48.792847,-23.648873],[-50.044106,-21.358805],[-50.824885,-18.703782],[-50.989686,-15.890093],[-50.393010,-13.124030],[-49.902967,-12.352169],[-49.173207,-11.845451],[-47.260016,-11.596253],[-45.184408,-12.314055],[-43.477350,-13.936480]]);
       translate([0, 0, -fudge])
         linear_extrude(height=h+2*fudge)
           polygon([[-32.630450,-4.572699],[-32.738154,-6.098637],[-32.353710,-9.524569],[-30.548082,-19.850161],[-28.092973,-31.096973],[-25.867790,-38.812500],[-24.692693,-40.973486],[-23.079358,-42.883321],[-21.122828,-44.497026],[-18.918145,-45.769623],[-16.560354,-46.656135],[-14.144497,-47.111584],[-11.765618,-47.090992],[-9.518760,-46.549380],[-8.161697,-45.925265],[-7.423712,-45.236161],[-7.208137,-44.319255],[-7.418300,-43.011730],[-7.693901,-41.609801],[-7.413411,-40.938823],[-6.286526,-40.840008],[-4.022940,-41.154570],[0.000000,-41.797860],[0.000000,-37.670060],[0.000000,-33.542249],[6.369160,-33.542249],[12.738320,-33.542249],[13.358150,-29.792249],[13.988990,-21.669799],[14.261559,-18.339868],[14.689889,-18.042531],[15.399800,-18.459089],[17.053373,-20.957083],[19.063300,-25.331539],[20.940442,-29.769163],[22.430579,-32.259175],[23.949851,-33.288187],[25.914400,-33.342810],[27.319073,-33.039409],[28.131561,-32.297301],[28.547197,-30.752808],[28.761310,-28.042250],[29.543275,-20.915245],[30.148548,-19.135248],[30.897130,-18.542250],[32.174973,-20.378188],[34.040950,-24.792250],[35.936469,-29.573500],[37.285320,-32.292250],[38.794372,-33.179955],[41.024004,-33.508141],[43.205544,-33.262437],[44.038069,-32.919885],[44.570320,-32.428470],[44.391217,-31.080591],[43.385043,-28.321444],[39.752720,-20.330941],[35.395830,-11.980148],[32.036850,-6.792250],[30.457276,-5.409780],[28.967515,-4.675323],[27.604797,-4.562819],[26.406356,-5.046209],[25.409424,-6.099431],[24.651232,-7.696425],[24.169013,-9.811132],[24.000000,-12.417490],[23.737884,-15.409236],[23.107690,-16.975690],[22.496280,-16.744755],[21.491175,-15.708304],[18.857690,-11.886770],[16.724026,-8.607335],[14.793735,-6.274341],[13.071017,-4.887690],[11.560073,-4.447285],[10.265103,-4.953027],[9.190309,-6.404819],[8.339891,-8.802563],[7.718050,-12.146160],[6.582607,-20.268608],[5.580234,-24.384146],[4.940368,-25.364930],[4.107474,-25.854714],[1.560870,-26.042250],[-0.710843,-25.954127],[-2.028418,-25.390588],[-2.862568,-23.902880],[-3.684010,-21.042250],[-4.661062,-16.554786],[-4.622965,-13.771365],[-4.184070,-12.880046],[-3.444388,-12.248387],[-1.000000,-11.542250],[0.859375,-11.182872],[1.916666,-10.625579],[2.390625,-9.651621],[2.500000,-8.042250],[2.396686,-6.334848],[1.777885,-5.405233],[0.180312,-4.967614],[-2.859320,-4.736200],[-6.187373,-4.743730],[-8.758247,-5.262554],[-10.612317,-6.399701],[-11.789959,-8.262200],[-12.331547,-10.957079],[-12.277459,-14.591366],[-11.668068,-19.272090],[-10.543750,-25.106280],[-8.005140,-38.292250],[-8.296370,-38.778038],[-9.086203,-39.147932],[-11.631535,-39.519173],[-14.580847,-39.364232],[-16.873850,-38.641370],[-17.703714,-37.071117],[-18.947646,-33.438983],[-22.004340,-22.153150],[-25.022290,-10.683373],[-27.002930,-5.038710],[-28.279068,-4.025977],[-29.797130,-3.597916],[-31.324972,-3.773750],[-32.630450,-4.572700]]);
       translate([0, 0, -fudge])
         linear_extrude(height=h+2*fudge)
           polygon([[49.090150,-4.473599],[47.221168,-5.275082],[45.606919,-6.609617],[44.277035,-8.396347],[43.261147,-10.554414],[42.588886,-13.002962],[42.289882,-15.661133],[42.393767,-18.448071],[42.930170,-21.282919],[44.064205,-24.395791],[45.663132,-27.142501],[47.675520,-29.488936],[50.049937,-31.400985],[52.734954,-32.844538],[55.679137,-33.785484],[58.831056,-34.189711],[62.139280,-34.023109],[65.993182,-33.234663],[67.173009,-32.639587],[67.912104,-31.805115],[68.253481,-30.652126],[68.240154,-29.101500],[67.321440,-24.490849],[66.162359,-18.027164],[65.613800,-11.542269],[65.500000,-5.042269],[59.427170,-4.960769],[54.865875,-4.753123],[52.427170,-4.368289],[51.064461,-4.188439],[49.090150,-4.473589]]);
       translate([0, 0, -fudge])
         linear_extrude(height=h+2*fudge)
           polygon([[56.598050,-12.700909],[57.545301,-15.427949],[58.534094,-19.776169],[59.205852,-23.913264],[59.202000,-26.006929],[58.031292,-26.547230],[56.488965,-26.381499],[54.786333,-25.573168],[53.134710,-24.185669],[51.408410,-21.523786],[50.388671,-18.326536],[50.206519,-15.275117],[50.470484,-14.016970],[50.992980,-13.050730],[52.353273,-12.011479],[53.973775,-11.592225],[55.505147,-11.814768],[56.598050,-12.700910]]);
       translate([0, 0, -fudge])
         linear_extrude(height=h+2*fudge)
           polygon([[95.211910,-4.673339],[92.873208,-5.763713],[90.963466,-7.497263],[89.510502,-9.762983],[88.542132,-12.449864],[88.086175,-15.446898],[88.170448,-18.643078],[88.822767,-21.927394],[90.070950,-25.188840],[91.508638,-27.590186],[93.305876,-29.683165],[95.380839,-31.427654],[97.651701,-32.783528],[100.036637,-33.710663],[102.453821,-34.168936],[104.821427,-34.118223],[107.057630,-33.518400],[109.306813,-32.267271],[110.841649,-30.628989],[111.720067,-28.513442],[112.000000,-25.830520],[111.748281,-23.921849],[111.036960,-22.069549],[109.931793,-20.334110],[108.498532,-18.776020],[106.802935,-17.455770],[104.910753,-16.433851],[102.887744,-15.770751],[100.799660,-15.526960],[98.737356,-15.239281],[97.008360,-14.568600],[96.338405,-13.995217],[96.105038,-13.424587],[96.277570,-12.876871],[96.825312,-12.372230],[98.923678,-11.572818],[102.154630,-11.187640],[104.430382,-11.029936],[105.795186,-10.652146],[106.509720,-9.914425],[106.834660,-8.676930],[106.825849,-6.782175],[106.334660,-5.548230],[104.447149,-4.703172],[101.485474,-4.238018],[98.167704,-4.209247],[95.211910,-4.673340]]);
       translate([0, 0, -fudge])
         linear_extrude(height=h+2*fudge)
           polygon([[103.500000,-23.185119],[104.328585,-24.106739],[104.621124,-24.806243],[104.385953,-25.483763],[103.631410,-26.339430],[102.747513,-27.092912],[101.946523,-27.323440],[100.970118,-27.020485],[99.559980,-26.173520],[97.751994,-24.555033],[97.000000,-23.019210],[97.194326,-22.361761],[97.724298,-21.902139],[99.473127,-21.568257],[101.610393,-22.001329],[103.500000,-23.185119]]);
       translate([0, 0, -fudge])
         linear_extrude(height=h+2*fudge)
           polygon([[68.800250,-5.641509],[69.276550,-10.021502],[70.988430,-18.851919],[72.853159,-26.680384],[73.732268,-29.203023],[74.723426,-31.000014],[75.937299,-32.222917],[77.484553,-33.023294],[82.021860,-33.962709],[85.948898,-34.101891],[87.423147,-33.813692],[88.549853,-33.300980],[89.312989,-32.574264],[89.696531,-31.644052],[89.684456,-30.520854],[89.260740,-29.215179],[88.522205,-27.974875],[87.551438,-27.140419],[86.204984,-26.628456],[84.339390,-26.355630],[80.578170,-26.042269],[78.039080,-15.542269],[76.526577,-9.499218],[75.422206,-6.344468],[74.860106,-5.540568],[74.204482,-5.087179],[72.351920,-4.736509],[69.980930,-4.860149],[69.197656,-5.179863],[68.800250,-5.641509]]);
       translate([0, 0, -fudge])
         linear_extrude(height=h+2*fudge)
           polygon([[-215.765196,-14.504109],[-220.732091,-15.177763],[-223.723521,-16.149316],[-224.525052,-16.772872],[-224.888656,-17.502185],[-224.832979,-18.347681],[-224.376666,-19.319789],[-222.829043,-20.638695],[-220.395977,-21.318447],[-217.334961,-21.326795],[-213.903486,-20.631490],[-209.576490,-18.724687],[-206.324949,-16.333217],[-205.391675,-15.236408],[-205.074306,-14.355241],[-205.488523,-13.801988],[-206.750006,-13.688919],[-215.765196,-14.504109]]);
       translate([0, 0, -fudge])
         linear_extrude(height=h+2*fudge)
           polygon([[-121.750000,-15.141350],[-122.557469,-15.641063],[-122.962327,-16.212787],[-122.974534,-16.844079],[-122.604049,-17.522493],[-120.754843,-18.970910],[-117.494390,-20.458480],[-111.740016,-23.091805],[-105.636330,-26.530330],[-101.158540,-29.163514],[-98.197175,-30.311245],[-97.140517,-30.354654],[-96.289403,-30.058605],[-94.972390,-28.490679],[-94.195898,-26.067360],[-94.467378,-23.767053],[-95.722478,-21.634111],[-97.896848,-19.712883],[-100.926135,-18.047722],[-104.745991,-16.682979],[-109.292063,-15.663005],[-114.500000,-15.032150],[-119.104688,-14.875145],[-121.750000,-15.141350]]);
       translate([0, 0, -fudge])
         linear_extrude(height=h+2*fudge)
           polygon([[-17.620000,-28.994380],[-17.859249,-30.456984],[-17.373481,-31.575655],[-16.216218,-32.290661],[-14.440980,-32.542270],[-12.946173,-32.392408],[-12.187864,-31.857788],[-12.097615,-30.810853],[-12.606990,-29.124050],[-13.606433,-27.993636],[-15.119105,-27.586320],[-16.628972,-27.915451],[-17.620000,-28.994380]]);
       translate([0, 0, -fudge])
         linear_extrude(height=h+2*fudge)
           polygon([[-193.133336,-33.740269],[-196.906360,-37.076187],[-201.250006,-40.371649],[-204.123532,-42.672014],[-205.654739,-44.726137],[-205.925551,-45.680120],[-205.871079,-46.595658],[-204.800006,-48.342219],[-203.416550,-49.192362],[-201.769344,-49.322697],[-199.930678,-48.785540],[-197.972841,-47.633202],[-195.968123,-45.917998],[-193.988815,-43.692240],[-192.107206,-41.008243],[-190.395586,-37.918319],[-188.682188,-33.605396],[-188.459961,-32.212602],[-188.642042,-31.357419],[-189.214426,-31.061220],[-190.163106,-31.345380],[-193.133336,-33.740269]]);
       translate([0, 0, -fudge])
         linear_extrude(height=h+2*fudge)
           polygon([[-141.000000,-35.704669],[-140.115511,-37.904010],[-137.988970,-41.559409],[-135.105532,-46.751939],[-132.401270,-52.646949],[-130.460087,-57.231771],[-129.020714,-59.635218],[-128.329415,-60.195425],[-127.571821,-60.422090],[-125.602080,-60.157189],[-123.609602,-59.320062],[-122.293291,-58.012483],[-121.645760,-56.283502],[-121.659621,-54.182168],[-122.327487,-51.757531],[-123.641969,-49.058641],[-125.595679,-46.134547],[-128.181230,-43.034299],[-132.850510,-38.507362],[-136.960701,-35.538169],[-138.610528,-34.749575],[-139.885850,-34.484634],[-140.708422,-34.788085],[-141.000000,-35.704669]]);
       translate([0, 0, -fudge])
         linear_extrude(height=h+2*fudge)
           polygon([[-166.423836,-39.728839],[-167.498555,-48.227989],[-168.369626,-59.542219],[-168.352775,-61.404230],[-168.025169,-62.504718],[-167.230541,-63.076551],[-165.812626,-63.352599],[-164.464173,-63.362683],[-163.343866,-63.016262],[-162.360209,-62.265624],[-161.421706,-61.063059],[-160.576970,-58.947102],[-160.190068,-56.103469],[-160.216656,-52.805049],[-160.612392,-49.324730],[-161.332933,-45.935402],[-162.333936,-42.909954],[-163.571058,-40.521273],[-164.999956,-39.042249],[-165.836568,-38.985370],[-166.423836,-39.728839]]);
    }
  }
}

poly_path3027(2);
